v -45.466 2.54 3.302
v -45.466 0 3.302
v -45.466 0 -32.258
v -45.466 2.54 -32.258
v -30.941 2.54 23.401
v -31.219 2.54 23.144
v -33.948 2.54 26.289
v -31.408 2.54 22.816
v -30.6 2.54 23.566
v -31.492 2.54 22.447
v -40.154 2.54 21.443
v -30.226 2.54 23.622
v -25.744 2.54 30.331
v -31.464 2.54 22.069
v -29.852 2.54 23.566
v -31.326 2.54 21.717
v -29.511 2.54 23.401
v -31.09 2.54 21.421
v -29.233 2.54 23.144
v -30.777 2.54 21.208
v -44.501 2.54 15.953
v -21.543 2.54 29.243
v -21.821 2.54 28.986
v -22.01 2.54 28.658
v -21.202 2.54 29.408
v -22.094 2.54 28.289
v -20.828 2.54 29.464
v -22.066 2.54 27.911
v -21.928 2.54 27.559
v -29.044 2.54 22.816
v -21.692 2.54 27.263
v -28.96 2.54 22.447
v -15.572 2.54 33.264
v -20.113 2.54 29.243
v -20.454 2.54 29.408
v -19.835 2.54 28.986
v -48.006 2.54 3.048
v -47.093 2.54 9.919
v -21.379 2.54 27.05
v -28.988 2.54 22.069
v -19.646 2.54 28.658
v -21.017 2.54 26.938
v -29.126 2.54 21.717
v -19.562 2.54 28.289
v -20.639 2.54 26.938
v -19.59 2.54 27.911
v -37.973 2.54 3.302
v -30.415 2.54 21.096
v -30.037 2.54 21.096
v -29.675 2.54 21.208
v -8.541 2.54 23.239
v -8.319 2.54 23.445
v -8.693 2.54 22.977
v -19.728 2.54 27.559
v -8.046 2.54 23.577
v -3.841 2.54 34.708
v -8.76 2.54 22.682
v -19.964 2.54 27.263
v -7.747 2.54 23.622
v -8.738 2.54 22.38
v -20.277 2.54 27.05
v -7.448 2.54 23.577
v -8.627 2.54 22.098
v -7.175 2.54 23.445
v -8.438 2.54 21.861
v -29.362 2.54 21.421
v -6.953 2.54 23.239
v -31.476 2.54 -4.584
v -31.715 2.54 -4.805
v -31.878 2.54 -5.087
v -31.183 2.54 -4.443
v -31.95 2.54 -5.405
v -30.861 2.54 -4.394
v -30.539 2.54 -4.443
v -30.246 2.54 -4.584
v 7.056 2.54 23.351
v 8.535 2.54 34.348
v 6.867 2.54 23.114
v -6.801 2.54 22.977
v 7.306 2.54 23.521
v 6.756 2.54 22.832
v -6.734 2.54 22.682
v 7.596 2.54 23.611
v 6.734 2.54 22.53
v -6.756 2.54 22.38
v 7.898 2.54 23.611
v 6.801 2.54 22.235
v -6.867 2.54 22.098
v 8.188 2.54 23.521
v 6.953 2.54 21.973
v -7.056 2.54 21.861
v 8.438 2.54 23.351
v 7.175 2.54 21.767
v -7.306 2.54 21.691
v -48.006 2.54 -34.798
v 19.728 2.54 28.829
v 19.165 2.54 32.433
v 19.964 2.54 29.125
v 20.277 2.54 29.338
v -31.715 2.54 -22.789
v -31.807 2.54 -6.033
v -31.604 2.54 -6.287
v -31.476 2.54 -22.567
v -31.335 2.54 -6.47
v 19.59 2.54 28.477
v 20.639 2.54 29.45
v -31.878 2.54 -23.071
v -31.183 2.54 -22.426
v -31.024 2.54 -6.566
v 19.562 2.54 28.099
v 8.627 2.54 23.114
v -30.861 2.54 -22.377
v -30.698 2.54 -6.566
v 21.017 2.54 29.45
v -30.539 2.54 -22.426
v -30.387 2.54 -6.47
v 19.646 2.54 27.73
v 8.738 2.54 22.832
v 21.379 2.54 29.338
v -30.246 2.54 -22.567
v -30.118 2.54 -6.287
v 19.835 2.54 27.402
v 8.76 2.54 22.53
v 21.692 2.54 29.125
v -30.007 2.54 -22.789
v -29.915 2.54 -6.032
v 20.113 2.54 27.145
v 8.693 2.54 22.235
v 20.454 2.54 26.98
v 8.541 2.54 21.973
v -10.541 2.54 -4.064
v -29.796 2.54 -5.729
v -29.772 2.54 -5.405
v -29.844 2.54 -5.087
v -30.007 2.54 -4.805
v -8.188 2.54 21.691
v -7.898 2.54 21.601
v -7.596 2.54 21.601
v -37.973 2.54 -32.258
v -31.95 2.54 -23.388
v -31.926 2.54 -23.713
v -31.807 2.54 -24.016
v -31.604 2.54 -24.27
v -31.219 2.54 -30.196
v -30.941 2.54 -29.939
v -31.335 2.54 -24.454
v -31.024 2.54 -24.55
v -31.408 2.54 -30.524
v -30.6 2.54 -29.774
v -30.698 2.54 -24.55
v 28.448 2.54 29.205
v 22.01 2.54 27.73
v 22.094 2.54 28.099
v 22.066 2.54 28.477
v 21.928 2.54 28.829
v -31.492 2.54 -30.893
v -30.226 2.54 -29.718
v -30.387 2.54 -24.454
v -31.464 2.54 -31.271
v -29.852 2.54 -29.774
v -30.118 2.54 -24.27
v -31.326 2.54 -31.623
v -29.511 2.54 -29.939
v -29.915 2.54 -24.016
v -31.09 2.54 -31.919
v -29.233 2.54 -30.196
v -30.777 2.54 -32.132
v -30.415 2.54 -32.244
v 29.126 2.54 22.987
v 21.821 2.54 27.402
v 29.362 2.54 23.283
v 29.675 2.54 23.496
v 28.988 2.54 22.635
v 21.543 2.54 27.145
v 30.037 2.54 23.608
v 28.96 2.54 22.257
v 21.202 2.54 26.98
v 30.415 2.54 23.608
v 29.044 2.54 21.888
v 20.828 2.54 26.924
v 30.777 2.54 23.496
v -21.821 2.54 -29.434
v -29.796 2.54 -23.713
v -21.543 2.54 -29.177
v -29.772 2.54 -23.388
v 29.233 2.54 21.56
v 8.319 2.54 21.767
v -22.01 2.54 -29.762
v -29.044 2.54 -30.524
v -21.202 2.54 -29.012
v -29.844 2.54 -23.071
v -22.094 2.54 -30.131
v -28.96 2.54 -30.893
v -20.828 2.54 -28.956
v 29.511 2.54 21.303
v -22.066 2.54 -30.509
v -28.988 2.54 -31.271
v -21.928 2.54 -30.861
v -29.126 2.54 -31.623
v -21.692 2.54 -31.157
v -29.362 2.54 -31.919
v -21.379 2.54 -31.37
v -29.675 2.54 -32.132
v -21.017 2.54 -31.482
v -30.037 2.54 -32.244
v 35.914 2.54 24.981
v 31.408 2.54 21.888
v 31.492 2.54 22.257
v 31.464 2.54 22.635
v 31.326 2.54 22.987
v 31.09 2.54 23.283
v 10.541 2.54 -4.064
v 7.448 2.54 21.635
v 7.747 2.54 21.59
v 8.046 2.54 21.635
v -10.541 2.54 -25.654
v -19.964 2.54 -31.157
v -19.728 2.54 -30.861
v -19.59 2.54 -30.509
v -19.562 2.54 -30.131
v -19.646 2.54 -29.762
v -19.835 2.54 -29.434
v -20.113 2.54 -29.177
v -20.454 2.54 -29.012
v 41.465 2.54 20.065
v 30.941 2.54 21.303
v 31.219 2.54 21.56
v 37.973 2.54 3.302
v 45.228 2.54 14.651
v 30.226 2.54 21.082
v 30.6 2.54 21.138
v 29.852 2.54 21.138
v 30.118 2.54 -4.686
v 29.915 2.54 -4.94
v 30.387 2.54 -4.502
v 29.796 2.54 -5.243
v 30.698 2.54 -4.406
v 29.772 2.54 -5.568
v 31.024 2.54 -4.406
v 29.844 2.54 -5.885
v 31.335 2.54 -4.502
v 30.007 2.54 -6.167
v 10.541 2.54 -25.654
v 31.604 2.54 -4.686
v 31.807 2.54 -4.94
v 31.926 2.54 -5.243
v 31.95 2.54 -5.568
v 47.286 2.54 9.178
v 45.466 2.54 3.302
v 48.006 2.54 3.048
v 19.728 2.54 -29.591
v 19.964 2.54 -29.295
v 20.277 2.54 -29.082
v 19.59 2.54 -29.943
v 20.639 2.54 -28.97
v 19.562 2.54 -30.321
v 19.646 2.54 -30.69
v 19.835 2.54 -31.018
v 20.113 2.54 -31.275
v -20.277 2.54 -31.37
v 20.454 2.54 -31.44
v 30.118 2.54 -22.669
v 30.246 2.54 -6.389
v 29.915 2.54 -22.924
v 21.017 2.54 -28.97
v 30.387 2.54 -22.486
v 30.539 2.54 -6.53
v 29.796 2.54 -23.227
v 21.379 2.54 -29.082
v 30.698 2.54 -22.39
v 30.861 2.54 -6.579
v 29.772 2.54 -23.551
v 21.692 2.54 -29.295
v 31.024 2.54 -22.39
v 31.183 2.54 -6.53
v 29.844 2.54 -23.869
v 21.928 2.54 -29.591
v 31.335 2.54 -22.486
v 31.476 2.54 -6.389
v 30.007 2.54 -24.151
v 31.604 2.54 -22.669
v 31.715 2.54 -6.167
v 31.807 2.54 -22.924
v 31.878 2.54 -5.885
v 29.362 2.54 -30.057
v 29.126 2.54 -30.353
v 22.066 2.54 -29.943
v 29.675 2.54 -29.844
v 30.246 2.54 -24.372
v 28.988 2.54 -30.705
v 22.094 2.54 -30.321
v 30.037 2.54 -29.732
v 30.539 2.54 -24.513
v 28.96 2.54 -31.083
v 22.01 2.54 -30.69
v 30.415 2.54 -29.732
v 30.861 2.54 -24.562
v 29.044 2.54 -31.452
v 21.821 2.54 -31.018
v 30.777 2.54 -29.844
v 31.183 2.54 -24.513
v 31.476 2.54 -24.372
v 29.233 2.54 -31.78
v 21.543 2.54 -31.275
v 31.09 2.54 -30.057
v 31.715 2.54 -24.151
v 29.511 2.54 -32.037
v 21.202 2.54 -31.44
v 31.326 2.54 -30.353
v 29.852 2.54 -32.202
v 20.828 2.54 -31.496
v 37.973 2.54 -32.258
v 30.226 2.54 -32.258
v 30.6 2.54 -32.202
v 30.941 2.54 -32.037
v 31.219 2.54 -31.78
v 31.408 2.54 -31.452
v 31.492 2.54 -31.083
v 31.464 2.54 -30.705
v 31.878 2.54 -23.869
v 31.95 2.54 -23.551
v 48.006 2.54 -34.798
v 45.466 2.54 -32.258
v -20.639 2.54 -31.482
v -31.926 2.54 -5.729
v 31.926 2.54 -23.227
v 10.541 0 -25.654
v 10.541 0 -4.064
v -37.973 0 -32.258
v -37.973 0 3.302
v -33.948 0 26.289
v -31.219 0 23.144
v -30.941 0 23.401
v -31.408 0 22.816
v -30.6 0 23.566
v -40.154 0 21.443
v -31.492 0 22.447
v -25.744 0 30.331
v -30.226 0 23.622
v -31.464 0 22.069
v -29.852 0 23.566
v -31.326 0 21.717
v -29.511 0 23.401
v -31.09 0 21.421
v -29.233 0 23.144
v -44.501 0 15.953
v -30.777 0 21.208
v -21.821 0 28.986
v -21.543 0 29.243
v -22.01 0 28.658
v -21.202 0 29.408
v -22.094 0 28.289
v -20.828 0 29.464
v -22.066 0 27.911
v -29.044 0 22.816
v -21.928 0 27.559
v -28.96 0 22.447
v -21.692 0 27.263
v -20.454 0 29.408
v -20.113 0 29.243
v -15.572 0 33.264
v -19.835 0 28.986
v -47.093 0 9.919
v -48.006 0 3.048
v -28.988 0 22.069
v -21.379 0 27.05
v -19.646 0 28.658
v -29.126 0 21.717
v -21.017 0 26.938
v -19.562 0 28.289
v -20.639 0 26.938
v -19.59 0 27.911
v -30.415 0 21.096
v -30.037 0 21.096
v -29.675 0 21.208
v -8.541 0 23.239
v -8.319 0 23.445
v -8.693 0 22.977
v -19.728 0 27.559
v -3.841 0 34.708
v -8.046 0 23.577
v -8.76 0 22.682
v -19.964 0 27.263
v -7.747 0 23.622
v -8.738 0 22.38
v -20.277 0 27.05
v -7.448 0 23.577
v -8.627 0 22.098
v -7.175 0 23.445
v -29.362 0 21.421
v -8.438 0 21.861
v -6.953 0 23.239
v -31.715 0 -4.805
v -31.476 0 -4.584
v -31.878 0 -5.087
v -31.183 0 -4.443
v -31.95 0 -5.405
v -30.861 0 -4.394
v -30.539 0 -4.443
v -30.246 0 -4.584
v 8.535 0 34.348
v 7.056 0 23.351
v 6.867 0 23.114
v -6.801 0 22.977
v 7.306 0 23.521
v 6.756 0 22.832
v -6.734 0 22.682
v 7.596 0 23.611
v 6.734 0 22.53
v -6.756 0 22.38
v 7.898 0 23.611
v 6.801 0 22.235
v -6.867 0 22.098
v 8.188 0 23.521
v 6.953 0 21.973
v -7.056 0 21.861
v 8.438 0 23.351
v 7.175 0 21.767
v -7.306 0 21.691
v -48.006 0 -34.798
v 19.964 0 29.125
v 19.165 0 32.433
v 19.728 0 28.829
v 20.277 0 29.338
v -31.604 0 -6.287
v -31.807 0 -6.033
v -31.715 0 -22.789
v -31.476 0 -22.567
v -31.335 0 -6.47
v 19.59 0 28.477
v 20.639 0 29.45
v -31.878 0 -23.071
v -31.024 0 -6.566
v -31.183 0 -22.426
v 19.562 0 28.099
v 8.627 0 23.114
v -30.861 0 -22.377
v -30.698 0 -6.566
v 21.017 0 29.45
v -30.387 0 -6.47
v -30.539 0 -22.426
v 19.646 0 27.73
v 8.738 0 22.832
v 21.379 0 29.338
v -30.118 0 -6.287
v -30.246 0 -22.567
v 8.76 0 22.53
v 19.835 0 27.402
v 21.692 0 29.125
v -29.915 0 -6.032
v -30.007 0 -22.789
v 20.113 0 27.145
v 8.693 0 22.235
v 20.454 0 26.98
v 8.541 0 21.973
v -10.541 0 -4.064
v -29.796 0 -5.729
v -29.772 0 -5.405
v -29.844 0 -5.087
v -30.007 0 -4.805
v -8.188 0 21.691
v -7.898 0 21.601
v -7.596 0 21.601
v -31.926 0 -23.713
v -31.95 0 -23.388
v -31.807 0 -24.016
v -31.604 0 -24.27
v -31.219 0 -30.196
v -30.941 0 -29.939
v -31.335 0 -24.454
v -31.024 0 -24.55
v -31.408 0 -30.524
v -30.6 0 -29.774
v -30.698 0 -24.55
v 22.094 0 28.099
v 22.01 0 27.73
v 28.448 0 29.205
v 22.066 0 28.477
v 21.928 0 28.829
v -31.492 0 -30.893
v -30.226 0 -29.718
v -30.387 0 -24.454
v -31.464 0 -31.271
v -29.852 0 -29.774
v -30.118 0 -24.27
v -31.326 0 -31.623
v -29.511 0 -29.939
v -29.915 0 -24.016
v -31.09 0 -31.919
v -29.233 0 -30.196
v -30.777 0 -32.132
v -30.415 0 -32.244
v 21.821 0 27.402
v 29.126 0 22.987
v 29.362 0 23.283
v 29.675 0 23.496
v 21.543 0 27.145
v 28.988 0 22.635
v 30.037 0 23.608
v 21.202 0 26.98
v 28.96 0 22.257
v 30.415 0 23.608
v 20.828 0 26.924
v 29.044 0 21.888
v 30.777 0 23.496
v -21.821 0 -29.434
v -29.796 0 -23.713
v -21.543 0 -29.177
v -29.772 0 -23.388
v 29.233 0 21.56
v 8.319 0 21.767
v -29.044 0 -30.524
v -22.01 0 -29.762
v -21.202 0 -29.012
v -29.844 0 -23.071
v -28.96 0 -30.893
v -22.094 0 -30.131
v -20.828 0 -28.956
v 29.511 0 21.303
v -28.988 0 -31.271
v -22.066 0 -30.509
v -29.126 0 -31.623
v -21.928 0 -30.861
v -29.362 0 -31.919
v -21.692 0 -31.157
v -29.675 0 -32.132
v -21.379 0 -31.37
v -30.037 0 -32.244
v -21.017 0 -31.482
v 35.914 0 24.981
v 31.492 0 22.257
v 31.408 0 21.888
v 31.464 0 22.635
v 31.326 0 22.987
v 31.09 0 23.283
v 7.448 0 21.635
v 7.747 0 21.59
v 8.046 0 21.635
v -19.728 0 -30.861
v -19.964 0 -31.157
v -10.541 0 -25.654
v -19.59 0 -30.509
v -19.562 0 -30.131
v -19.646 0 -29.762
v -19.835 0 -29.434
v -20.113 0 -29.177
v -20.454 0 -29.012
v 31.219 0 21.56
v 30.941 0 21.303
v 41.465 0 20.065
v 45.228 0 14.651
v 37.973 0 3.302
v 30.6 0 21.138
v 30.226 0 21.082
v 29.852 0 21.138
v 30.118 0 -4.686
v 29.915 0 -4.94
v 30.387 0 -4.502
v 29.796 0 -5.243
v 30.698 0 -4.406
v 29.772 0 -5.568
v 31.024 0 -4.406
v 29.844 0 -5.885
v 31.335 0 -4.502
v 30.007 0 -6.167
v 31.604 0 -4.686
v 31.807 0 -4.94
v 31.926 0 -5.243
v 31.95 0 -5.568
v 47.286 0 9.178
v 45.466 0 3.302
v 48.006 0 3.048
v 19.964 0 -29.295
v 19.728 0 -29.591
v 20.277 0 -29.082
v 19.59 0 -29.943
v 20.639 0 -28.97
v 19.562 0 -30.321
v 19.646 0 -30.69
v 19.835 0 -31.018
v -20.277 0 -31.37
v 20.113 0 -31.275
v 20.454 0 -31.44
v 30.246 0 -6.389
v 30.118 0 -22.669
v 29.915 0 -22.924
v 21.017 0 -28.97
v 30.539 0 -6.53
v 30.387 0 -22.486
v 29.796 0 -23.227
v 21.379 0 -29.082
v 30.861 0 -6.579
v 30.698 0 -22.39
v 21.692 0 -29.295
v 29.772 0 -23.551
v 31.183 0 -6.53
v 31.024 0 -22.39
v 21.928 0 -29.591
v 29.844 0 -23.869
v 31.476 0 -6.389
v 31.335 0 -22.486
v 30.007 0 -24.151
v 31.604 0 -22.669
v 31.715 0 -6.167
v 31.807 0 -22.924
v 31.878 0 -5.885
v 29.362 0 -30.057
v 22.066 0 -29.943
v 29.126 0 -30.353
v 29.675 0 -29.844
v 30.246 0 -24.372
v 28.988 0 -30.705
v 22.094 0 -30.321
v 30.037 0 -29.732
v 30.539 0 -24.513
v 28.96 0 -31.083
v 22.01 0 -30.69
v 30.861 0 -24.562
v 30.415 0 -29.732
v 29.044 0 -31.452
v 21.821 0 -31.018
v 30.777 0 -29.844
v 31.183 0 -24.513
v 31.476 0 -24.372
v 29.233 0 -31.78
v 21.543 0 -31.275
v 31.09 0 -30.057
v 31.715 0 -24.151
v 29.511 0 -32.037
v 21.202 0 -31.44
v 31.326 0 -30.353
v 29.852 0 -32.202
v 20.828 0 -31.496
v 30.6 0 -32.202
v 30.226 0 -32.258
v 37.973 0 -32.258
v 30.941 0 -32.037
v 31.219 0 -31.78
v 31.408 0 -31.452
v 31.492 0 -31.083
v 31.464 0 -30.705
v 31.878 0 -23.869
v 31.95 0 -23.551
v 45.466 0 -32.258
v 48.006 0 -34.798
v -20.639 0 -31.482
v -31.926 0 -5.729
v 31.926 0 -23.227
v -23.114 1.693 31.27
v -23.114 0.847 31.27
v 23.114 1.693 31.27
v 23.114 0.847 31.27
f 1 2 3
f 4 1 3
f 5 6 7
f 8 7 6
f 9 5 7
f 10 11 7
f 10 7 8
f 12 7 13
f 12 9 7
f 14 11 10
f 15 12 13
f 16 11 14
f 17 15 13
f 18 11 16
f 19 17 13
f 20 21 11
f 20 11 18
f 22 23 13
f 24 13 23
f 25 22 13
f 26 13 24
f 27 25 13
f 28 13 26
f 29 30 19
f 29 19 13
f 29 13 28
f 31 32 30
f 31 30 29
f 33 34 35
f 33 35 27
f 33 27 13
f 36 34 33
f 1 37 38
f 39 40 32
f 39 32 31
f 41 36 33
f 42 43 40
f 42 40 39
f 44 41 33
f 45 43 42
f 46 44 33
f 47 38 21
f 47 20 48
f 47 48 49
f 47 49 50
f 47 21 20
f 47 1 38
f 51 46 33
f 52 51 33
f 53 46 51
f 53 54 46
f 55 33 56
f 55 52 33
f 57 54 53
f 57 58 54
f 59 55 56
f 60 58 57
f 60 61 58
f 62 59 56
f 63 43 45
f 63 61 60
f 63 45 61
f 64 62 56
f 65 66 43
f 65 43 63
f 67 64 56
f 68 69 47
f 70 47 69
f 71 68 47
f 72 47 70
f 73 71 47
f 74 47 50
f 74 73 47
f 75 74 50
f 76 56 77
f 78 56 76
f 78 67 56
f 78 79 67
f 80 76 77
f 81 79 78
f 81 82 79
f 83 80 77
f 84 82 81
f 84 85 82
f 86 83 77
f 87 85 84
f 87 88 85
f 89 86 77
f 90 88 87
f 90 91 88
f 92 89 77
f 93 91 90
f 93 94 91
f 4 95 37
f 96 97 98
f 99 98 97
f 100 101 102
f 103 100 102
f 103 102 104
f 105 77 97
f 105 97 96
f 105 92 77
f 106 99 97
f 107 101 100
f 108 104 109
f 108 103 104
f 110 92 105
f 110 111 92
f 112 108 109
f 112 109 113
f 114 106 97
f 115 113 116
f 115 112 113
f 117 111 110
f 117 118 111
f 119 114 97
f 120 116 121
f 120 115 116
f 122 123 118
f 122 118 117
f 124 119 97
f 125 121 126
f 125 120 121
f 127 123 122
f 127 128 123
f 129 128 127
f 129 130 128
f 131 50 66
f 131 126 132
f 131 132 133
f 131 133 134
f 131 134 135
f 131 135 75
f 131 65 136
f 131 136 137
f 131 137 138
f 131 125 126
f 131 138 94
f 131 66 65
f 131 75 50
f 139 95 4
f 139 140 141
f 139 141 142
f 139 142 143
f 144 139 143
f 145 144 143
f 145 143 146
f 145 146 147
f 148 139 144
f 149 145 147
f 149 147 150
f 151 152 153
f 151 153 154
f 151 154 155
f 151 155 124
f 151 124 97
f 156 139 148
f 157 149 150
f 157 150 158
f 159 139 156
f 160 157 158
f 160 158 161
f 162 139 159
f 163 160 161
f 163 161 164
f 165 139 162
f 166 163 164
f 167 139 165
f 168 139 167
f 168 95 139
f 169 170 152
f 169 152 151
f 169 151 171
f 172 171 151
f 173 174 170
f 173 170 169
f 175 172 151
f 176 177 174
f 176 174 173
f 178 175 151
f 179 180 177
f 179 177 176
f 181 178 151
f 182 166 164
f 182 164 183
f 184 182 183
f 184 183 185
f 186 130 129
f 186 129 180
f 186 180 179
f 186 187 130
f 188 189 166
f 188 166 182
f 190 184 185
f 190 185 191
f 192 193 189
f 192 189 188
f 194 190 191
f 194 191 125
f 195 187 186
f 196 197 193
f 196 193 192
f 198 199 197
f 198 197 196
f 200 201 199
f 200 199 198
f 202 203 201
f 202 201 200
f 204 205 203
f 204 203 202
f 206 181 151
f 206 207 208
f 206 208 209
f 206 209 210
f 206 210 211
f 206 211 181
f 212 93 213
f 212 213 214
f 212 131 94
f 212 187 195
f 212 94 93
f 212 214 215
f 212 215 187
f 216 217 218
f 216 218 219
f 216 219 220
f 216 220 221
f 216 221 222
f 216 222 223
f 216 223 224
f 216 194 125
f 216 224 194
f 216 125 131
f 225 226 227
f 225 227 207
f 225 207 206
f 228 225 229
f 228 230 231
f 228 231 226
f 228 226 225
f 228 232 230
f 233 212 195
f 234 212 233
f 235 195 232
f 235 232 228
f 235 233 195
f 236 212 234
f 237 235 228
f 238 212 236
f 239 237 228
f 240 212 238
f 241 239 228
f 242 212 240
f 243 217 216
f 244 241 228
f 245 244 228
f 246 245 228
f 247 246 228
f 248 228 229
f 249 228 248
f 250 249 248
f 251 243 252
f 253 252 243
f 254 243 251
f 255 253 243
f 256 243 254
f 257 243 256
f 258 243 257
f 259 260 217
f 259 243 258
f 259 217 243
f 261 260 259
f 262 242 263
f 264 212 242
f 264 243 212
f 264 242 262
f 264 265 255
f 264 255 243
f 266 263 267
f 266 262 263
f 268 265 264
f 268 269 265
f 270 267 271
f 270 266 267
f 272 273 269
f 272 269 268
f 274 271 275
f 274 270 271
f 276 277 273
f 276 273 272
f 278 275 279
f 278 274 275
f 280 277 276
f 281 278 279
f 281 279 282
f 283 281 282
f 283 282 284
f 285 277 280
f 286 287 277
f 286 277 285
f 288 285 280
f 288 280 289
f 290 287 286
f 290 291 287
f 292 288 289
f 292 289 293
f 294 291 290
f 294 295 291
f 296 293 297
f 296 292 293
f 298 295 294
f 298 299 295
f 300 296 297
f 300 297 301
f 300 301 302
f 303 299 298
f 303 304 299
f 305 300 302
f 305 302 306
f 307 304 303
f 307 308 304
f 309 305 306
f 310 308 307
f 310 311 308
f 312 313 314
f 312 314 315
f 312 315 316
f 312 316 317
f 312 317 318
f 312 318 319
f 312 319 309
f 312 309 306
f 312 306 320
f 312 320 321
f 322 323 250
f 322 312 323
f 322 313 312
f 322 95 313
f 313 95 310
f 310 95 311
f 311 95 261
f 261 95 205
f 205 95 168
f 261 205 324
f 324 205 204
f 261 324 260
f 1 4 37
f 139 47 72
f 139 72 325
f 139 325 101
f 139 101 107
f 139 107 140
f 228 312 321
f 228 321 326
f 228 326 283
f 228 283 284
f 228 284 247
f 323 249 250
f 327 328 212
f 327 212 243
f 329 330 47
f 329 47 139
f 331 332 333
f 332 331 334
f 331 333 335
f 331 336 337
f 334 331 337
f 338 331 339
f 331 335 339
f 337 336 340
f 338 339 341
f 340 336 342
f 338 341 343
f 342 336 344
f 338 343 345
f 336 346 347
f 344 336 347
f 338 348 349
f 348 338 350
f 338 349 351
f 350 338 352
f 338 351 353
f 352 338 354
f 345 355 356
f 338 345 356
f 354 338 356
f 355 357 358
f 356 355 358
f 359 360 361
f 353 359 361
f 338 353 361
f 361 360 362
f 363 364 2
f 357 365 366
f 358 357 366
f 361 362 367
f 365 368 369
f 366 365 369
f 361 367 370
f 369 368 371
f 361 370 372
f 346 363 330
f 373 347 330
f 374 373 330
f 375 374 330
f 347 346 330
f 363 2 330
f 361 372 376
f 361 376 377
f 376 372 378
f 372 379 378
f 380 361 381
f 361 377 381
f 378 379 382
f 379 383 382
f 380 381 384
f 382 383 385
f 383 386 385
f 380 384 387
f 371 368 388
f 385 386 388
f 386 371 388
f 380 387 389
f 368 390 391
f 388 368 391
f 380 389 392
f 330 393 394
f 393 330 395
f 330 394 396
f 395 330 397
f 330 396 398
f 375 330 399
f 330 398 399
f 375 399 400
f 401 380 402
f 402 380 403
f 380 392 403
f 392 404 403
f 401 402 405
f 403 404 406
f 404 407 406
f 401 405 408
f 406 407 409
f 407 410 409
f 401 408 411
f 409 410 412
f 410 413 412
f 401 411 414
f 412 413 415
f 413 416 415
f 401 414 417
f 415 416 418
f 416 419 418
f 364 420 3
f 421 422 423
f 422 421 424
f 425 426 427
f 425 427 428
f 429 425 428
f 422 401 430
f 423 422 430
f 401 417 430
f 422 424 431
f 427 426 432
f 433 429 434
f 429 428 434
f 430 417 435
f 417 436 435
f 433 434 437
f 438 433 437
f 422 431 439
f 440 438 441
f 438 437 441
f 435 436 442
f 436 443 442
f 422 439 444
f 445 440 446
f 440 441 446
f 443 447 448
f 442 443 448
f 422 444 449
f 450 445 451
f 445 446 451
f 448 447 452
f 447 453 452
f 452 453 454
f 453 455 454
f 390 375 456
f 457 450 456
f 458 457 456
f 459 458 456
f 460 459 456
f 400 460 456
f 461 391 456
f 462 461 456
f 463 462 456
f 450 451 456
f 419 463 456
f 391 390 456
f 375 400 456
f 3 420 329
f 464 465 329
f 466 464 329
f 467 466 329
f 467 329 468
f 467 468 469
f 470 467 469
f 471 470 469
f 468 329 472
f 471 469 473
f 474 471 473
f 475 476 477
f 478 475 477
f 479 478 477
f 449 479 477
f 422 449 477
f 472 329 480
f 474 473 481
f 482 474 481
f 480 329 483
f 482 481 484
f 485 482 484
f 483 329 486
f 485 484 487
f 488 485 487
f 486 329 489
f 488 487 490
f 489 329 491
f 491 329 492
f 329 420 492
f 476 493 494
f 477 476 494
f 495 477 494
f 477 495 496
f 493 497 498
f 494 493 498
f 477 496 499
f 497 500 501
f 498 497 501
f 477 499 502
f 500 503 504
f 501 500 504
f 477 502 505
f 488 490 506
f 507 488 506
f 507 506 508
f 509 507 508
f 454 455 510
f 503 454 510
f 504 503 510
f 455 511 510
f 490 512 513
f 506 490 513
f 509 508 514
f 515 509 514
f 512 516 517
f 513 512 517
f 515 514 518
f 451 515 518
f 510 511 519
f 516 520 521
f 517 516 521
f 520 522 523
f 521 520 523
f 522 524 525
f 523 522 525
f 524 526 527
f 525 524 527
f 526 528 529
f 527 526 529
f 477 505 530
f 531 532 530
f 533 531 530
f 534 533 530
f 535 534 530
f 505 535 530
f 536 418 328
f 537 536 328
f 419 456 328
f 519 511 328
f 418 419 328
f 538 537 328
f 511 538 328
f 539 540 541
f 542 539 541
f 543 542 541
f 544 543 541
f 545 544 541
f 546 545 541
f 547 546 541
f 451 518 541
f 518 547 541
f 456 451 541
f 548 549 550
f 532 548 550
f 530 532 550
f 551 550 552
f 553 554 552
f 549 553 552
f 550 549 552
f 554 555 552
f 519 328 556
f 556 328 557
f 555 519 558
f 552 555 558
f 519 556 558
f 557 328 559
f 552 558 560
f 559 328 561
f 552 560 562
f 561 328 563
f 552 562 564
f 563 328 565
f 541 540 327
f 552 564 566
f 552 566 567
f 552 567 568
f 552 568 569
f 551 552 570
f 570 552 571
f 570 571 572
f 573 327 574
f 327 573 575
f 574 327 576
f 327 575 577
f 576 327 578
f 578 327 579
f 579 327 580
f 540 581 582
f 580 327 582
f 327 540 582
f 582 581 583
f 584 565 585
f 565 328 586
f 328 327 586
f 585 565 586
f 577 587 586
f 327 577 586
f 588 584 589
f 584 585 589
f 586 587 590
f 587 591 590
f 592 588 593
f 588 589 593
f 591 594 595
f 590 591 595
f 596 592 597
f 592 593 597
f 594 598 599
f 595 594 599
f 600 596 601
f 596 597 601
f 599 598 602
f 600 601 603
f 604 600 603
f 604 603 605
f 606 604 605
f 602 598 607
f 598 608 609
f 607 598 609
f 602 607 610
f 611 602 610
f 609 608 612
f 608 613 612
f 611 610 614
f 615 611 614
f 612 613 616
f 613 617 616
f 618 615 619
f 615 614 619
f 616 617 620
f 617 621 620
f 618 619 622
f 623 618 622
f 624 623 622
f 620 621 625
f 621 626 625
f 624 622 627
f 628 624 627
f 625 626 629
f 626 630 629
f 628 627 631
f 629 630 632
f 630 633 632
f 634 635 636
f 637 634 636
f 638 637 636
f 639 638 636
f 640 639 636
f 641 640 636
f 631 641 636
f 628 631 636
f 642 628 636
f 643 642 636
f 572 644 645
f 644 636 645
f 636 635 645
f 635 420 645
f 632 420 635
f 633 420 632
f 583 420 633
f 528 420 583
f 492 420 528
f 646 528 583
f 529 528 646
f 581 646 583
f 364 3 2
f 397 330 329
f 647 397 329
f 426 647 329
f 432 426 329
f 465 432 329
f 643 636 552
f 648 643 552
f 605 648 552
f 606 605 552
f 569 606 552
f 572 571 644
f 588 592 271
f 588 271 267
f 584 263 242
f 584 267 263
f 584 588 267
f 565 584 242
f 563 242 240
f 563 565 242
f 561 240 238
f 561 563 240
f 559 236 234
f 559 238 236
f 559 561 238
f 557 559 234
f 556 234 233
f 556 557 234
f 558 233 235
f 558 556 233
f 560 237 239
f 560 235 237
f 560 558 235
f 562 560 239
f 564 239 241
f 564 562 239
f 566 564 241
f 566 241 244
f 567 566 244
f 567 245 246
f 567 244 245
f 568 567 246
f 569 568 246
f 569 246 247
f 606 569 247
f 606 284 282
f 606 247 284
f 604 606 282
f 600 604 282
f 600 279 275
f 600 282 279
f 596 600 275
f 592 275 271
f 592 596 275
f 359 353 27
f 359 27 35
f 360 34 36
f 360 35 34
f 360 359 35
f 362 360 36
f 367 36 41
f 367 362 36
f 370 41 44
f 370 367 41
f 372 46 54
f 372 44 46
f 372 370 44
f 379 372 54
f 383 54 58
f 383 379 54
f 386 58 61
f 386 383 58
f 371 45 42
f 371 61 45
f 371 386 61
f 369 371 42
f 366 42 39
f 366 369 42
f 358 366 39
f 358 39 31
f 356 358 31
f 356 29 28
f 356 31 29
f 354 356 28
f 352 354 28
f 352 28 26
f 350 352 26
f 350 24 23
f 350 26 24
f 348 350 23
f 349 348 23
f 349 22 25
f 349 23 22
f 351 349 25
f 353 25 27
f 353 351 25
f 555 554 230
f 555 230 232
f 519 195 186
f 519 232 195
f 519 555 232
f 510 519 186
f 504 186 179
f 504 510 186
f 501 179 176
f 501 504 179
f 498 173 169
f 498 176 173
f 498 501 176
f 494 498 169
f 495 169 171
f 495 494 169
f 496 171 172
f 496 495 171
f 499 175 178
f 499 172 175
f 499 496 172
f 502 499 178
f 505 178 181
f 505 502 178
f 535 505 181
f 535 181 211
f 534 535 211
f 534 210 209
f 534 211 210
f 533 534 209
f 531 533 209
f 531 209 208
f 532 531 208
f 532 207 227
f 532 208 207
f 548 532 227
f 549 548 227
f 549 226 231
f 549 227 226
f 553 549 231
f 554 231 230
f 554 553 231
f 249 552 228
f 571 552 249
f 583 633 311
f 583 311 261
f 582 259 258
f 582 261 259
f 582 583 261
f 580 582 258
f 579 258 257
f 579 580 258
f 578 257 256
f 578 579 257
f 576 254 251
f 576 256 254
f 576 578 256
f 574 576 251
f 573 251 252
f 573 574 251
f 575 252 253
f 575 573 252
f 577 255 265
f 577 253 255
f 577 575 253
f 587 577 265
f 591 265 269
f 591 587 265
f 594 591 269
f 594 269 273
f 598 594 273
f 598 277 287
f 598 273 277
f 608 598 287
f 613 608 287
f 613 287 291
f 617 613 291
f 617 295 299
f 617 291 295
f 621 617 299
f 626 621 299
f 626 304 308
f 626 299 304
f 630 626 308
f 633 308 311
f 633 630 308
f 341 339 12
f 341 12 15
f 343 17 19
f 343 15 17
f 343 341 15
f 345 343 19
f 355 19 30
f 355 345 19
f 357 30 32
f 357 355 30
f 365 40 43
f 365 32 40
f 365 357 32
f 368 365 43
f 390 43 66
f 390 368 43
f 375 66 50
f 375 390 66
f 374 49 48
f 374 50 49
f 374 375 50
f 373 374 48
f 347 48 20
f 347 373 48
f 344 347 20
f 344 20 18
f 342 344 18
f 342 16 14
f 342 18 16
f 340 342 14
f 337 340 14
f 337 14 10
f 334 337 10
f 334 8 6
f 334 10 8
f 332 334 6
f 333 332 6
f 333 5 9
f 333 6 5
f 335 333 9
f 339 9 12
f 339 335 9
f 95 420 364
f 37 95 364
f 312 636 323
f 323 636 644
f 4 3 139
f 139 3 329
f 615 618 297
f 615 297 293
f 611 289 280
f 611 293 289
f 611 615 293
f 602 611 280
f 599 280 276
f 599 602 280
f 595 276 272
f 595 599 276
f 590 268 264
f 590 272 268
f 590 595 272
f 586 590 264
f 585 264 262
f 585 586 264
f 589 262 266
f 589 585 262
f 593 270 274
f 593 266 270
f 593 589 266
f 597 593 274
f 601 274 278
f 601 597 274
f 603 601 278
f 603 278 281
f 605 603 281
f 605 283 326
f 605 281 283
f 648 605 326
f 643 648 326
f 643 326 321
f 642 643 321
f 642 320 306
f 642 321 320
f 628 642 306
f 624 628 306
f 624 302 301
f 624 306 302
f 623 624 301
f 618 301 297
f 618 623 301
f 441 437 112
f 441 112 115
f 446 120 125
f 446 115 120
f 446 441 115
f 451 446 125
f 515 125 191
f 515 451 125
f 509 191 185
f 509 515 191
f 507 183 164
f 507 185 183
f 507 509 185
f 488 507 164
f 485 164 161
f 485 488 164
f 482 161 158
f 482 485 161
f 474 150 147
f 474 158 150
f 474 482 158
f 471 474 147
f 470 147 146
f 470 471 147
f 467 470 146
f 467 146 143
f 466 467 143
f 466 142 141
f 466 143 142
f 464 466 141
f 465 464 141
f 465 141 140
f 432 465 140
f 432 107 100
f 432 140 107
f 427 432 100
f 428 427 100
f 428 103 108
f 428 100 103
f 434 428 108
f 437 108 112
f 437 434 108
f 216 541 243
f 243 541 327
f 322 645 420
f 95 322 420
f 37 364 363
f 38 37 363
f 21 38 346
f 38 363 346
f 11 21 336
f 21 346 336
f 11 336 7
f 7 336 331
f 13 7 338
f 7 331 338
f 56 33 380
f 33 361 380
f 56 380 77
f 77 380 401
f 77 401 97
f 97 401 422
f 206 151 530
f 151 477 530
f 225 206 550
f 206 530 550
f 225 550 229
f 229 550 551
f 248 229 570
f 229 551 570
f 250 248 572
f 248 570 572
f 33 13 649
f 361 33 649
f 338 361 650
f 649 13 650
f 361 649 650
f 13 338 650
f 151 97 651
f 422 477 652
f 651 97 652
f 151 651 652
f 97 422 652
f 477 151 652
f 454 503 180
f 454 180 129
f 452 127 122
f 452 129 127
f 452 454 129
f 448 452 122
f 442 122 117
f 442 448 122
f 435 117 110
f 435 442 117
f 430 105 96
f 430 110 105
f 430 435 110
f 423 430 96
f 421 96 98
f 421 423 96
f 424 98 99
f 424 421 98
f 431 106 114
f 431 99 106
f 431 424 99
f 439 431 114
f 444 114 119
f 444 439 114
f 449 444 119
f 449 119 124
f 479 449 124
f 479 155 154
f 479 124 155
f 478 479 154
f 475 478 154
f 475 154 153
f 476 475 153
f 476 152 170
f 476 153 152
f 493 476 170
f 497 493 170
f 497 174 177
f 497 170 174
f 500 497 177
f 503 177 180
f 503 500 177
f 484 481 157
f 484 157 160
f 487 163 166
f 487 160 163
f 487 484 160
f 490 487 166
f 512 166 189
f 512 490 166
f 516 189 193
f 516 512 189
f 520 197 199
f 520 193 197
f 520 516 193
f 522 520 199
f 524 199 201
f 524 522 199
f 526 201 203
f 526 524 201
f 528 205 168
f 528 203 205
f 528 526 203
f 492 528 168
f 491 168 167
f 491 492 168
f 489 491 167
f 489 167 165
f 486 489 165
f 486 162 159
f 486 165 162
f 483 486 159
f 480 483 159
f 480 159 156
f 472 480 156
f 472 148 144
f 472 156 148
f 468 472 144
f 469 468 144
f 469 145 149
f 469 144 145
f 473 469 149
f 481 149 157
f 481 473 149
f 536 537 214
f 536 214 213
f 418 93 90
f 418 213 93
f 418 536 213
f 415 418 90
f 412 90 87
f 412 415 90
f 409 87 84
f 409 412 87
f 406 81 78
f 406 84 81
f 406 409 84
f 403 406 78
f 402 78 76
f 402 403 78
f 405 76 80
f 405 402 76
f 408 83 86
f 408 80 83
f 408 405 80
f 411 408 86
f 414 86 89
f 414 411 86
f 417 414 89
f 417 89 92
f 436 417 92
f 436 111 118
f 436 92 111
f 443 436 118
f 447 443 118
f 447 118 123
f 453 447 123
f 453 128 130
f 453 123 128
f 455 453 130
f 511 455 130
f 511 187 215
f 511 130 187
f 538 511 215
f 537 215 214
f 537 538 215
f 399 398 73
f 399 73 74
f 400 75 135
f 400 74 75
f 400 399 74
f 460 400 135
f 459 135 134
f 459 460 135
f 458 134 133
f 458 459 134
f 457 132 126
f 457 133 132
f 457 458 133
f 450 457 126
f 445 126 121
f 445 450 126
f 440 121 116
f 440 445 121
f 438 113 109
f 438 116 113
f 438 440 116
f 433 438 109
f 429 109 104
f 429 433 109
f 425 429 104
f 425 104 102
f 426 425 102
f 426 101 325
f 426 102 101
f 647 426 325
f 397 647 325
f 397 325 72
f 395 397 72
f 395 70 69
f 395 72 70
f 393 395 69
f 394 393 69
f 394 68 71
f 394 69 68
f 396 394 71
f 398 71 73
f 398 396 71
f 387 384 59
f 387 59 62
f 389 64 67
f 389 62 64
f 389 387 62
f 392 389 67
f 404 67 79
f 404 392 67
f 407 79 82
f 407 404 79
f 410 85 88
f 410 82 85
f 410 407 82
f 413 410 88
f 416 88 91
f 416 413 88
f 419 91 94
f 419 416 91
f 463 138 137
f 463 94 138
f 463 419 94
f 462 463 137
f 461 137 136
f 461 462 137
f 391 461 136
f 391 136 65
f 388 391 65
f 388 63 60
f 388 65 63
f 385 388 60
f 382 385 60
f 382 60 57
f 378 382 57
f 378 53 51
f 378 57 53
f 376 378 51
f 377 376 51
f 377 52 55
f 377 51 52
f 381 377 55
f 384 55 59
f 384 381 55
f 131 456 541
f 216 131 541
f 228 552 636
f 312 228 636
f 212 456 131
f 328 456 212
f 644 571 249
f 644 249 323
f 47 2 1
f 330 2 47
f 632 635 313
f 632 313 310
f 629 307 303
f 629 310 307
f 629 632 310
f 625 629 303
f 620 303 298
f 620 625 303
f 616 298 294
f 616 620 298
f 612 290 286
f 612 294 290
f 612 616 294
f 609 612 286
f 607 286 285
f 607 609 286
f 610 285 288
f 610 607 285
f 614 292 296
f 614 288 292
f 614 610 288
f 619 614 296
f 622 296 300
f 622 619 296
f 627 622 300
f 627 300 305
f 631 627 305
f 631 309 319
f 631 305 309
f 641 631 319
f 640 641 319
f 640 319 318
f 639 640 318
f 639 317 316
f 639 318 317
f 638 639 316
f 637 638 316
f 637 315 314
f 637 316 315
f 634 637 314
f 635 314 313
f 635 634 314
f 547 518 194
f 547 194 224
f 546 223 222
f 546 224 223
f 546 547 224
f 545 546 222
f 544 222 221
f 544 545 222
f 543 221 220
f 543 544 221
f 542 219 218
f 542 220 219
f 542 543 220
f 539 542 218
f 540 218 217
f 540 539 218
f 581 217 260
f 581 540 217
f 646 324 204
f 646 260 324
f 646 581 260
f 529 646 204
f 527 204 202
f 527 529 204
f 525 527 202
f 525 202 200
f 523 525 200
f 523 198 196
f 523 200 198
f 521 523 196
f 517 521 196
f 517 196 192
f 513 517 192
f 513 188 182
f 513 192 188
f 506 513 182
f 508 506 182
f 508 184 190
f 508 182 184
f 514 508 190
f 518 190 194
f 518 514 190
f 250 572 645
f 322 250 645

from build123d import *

# Parameters (mm, degrees)
BOSS_EXTRUDE1_DEPTH     = 2.54
CUT_EXTRUDE1_DEPTH      = 60.34583774
CUT_EXTRUDE1_DEPTH_BACK = 60.34583774
SKETCH3_R               = 1.0922
SKETCH3_R_2             = 1.27
SKETCH3_R_3             = 1.016
SKETCH3_W               = 7.493
SKETCH3_H               = 35.56
SKETCH3_W_2             = 21.082
SKETCH3_H_2             = 21.59


with BuildPart() as part:
    # Sketch2 → Boss-Extrude1 (new body)
    with BuildSketch(Plane(origin=(0, 0, 0), x_dir=(1, 0, 0), z_dir=(0, 1, 0))):
        with BuildLine():
            Line((48.006, 34.798), (-48.006, 34.798))
            Line((-48.006, 34.798), (-48.006, -3.048))
            add(Edge.make_bspline(
                [(-48.006, -3.048), (-48.006, -45.381333333), (48.006, -45.381333333), (48.006, -3.048)],
                knots=[0, 0, 0, 0, 1, 1, 1, 1], degree=3))
            Line((48.006, -3.048), (48.006, 34.798))
        make_face()
    extrude(amount=BOSS_EXTRUDE1_DEPTH)

    # Sketch3 → Cut-Extrude1 (cut, two sides: drawn at the far end of the back side and taken through both)
    with BuildSketch(Plane(origin=(0, 2.54, 0), x_dir=(1, 0, 0), z_dir=(0, 1, 0)).offset(-CUT_EXTRUDE1_DEPTH_BACK)):
        with Locations(Location((-30.861, 23.4696, 0), (0, 0, 270))):
            Circle(SKETCH3_R)
        with Locations(Location((-30.861, 5.4864, 0), (0, 0, 270))):
            Circle(SKETCH3_R)
        with Locations(Location((-30.226, 30.988, 0), (0, 0, 270))):
            Circle(SKETCH3_R_2)
        with Locations(Location((30.861, 5.4864, 0), (0, 0, 90))):
            Circle(SKETCH3_R)
        with Locations(Location((30.861, 23.4696, 0), (0, 0, 90))):
            Circle(SKETCH3_R)
        with Locations(Location((-30.226, -22.352, 0), (0, 0, 270))):
            Circle(SKETCH3_R_2)
        with Locations(Location((30.226, -22.352, 0), (0, 0, 90))):
            Circle(SKETCH3_R_2)
        with Locations(Location((30.226, 30.988, 0), (0, 0, 90))):
            Circle(SKETCH3_R_2)
        with Locations(Location((-7.747, -22.606, 0), (0, 0, 270))):
            Circle(SKETCH3_R_3)
        with Locations(Location((7.747, -22.606, 0), (0, 0, 90))):
            Circle(SKETCH3_R_3)
        with Locations(Location((-20.828, 30.226, 0), (0, 0, 270))):
            Circle(SKETCH3_R_2)
        with Locations(Location((-20.828, -28.194, 0), (0, 0, 270))):
            Circle(SKETCH3_R_2)
        with Locations(Location((20.828, -28.194, 0), (0, 0, 90))):
            Circle(SKETCH3_R_2)
        with Locations(Location((20.828, 30.226, 0), (0, 0, 90))):
            Circle(SKETCH3_R_2)
        with Locations((-41.7195, 14.478)):
            Rectangle(SKETCH3_W, SKETCH3_H)
        with Locations((41.7195, 14.478)):
            Rectangle(SKETCH3_W, SKETCH3_H)
        with Locations((0, 14.859)):
            Rectangle(SKETCH3_W_2, SKETCH3_H_2)
    extrude(amount=CUT_EXTRUDE1_DEPTH + CUT_EXTRUDE1_DEPTH_BACK, mode=Mode.SUBTRACT)


solid = part.part
